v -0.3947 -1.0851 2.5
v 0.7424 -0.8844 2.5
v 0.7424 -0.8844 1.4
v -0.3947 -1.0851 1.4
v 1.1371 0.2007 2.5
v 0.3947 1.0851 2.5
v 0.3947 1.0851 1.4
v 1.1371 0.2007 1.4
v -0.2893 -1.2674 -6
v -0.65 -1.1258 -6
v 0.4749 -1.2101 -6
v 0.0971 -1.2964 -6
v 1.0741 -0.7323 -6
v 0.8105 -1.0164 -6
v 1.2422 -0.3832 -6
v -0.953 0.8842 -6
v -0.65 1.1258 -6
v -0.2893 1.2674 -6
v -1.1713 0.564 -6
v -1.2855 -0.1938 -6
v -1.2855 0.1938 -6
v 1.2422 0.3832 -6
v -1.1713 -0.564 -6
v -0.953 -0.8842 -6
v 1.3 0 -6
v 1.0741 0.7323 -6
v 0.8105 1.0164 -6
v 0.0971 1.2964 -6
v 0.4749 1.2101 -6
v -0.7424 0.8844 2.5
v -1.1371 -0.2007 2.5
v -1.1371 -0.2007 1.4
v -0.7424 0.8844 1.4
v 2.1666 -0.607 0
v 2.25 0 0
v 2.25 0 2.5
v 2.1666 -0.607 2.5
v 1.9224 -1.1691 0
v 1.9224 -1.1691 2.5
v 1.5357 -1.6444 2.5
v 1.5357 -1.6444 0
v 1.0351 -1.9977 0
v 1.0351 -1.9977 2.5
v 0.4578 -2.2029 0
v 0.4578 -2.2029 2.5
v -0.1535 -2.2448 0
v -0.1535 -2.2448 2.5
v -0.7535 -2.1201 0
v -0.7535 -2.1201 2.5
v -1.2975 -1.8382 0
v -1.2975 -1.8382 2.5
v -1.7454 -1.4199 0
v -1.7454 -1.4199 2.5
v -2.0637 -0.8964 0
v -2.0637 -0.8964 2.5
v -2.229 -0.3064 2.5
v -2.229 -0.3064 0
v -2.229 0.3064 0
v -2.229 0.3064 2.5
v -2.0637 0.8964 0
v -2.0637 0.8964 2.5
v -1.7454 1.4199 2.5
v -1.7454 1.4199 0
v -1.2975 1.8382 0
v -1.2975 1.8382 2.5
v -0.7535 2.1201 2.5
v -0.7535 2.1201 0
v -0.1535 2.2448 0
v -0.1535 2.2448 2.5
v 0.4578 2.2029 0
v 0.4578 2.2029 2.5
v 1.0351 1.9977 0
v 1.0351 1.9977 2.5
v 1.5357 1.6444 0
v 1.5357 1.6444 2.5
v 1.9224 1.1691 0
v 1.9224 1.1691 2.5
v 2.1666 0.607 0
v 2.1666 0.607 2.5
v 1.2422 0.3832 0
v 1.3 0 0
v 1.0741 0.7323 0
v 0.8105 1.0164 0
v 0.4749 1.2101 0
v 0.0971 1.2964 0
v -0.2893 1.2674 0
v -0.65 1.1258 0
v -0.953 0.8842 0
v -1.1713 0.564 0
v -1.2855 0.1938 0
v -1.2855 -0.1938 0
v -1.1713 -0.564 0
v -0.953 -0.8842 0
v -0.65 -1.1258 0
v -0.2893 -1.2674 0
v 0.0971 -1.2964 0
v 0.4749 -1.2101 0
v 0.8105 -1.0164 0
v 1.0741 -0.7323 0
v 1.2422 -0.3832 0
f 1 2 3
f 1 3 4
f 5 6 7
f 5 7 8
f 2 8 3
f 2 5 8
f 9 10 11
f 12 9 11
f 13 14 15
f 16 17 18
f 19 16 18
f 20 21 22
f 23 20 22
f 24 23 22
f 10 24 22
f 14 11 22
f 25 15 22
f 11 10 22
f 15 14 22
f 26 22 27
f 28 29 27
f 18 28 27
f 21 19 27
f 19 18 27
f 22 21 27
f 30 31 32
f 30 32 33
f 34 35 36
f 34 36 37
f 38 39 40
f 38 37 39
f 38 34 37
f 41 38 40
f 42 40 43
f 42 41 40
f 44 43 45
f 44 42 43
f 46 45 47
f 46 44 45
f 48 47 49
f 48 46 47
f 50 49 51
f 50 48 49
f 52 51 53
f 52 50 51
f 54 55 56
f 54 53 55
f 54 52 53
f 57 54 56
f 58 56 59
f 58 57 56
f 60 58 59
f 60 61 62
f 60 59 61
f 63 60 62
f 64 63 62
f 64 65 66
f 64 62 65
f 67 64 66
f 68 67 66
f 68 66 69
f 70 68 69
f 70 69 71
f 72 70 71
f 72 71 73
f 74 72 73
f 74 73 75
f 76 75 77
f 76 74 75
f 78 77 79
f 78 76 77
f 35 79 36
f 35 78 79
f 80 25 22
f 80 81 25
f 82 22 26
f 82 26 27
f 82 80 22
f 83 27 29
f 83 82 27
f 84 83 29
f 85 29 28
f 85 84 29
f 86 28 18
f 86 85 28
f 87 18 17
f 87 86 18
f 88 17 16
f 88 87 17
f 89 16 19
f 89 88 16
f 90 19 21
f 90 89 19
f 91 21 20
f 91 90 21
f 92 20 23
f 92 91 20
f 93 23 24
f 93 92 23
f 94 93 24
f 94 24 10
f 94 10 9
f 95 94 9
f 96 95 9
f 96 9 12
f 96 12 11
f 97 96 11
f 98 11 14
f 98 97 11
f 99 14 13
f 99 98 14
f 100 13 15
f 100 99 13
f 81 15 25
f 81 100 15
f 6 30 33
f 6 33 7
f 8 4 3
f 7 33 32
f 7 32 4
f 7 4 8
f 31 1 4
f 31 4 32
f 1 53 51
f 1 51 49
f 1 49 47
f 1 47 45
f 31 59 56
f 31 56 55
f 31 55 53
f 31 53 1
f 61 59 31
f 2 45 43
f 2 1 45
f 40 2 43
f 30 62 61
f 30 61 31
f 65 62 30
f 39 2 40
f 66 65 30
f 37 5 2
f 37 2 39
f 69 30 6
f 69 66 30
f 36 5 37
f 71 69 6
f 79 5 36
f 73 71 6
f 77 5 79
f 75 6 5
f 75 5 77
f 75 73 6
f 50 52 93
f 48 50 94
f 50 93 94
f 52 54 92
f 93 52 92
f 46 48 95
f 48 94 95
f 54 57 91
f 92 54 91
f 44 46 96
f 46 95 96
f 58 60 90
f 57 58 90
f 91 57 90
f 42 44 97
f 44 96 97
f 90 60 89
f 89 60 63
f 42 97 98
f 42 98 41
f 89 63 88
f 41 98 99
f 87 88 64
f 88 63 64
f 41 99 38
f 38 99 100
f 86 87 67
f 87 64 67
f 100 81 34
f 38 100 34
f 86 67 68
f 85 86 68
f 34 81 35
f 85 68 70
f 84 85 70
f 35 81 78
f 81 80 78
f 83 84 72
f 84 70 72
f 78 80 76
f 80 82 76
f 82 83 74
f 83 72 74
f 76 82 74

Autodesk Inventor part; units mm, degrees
ref_plane "YZ Plane" through (0, 0, 0) normal (1, 0, 0) x (0, 1, 0)
ref_plane "XZ Plane" through (0, 0, 0) normal (0, 1, 0) x (-1, 0, 0)
ref_plane "XY Plane" through (0, 0, 0) normal (0, 0, 1) x (1, 0, 0)
sketch "スケッチ1" plane through (0, 0, 0) normal (0, 0, 1) x (1, 0, 0)
  circle A0 centre (0, 0) radius 2.25
  circle A1 centre (0, 0) radius 1.3
  dimension "d0" = 4.5
  dimension "d6" = 2.6
extrude "押し出し1" add sketch "スケッチ1" along normal blind 2.5 contours A0 | A1
sketch "スケッチ2" plane through (0, 0, 2.5) normal (0, 0, 1) x (1, 0, 0)
  circle A0 centre (0, 0) radius 2.25 projected
  line L0 (-0.3947, -1.0851) -> (-1.1371, -0.2007)
  line L1 (-1.1371, -0.2007) -> (-0.7424, 0.8844)
  line L2 (-0.7424, 0.8844) -> (0.3947, 1.0851)
  line L3 (0.3947, 1.0851) -> (1.1371, 0.2007)
  line L4 (1.1371, 0.2007) -> (0.7424, -0.8844)
  line L5 (0.7424, -0.8844) -> (-0.3947, -1.0851)
  dimension "d3" = 2
extrude "押し出し2" cut sketch "スケッチ2" against normal blind 1.1 contours L0 L1 L2 L3 L4 L5
extrude "押し出し3" add sketch "スケッチ1" against normal blind 6 contours A1
thread "ねじ1" size "M2.6x0.45" class "6g" standard "ANSI Metric M Profile" length 44.8
properties part number "ネジキャップM2.6L6ステンレス" material "ステンレス鋼"
